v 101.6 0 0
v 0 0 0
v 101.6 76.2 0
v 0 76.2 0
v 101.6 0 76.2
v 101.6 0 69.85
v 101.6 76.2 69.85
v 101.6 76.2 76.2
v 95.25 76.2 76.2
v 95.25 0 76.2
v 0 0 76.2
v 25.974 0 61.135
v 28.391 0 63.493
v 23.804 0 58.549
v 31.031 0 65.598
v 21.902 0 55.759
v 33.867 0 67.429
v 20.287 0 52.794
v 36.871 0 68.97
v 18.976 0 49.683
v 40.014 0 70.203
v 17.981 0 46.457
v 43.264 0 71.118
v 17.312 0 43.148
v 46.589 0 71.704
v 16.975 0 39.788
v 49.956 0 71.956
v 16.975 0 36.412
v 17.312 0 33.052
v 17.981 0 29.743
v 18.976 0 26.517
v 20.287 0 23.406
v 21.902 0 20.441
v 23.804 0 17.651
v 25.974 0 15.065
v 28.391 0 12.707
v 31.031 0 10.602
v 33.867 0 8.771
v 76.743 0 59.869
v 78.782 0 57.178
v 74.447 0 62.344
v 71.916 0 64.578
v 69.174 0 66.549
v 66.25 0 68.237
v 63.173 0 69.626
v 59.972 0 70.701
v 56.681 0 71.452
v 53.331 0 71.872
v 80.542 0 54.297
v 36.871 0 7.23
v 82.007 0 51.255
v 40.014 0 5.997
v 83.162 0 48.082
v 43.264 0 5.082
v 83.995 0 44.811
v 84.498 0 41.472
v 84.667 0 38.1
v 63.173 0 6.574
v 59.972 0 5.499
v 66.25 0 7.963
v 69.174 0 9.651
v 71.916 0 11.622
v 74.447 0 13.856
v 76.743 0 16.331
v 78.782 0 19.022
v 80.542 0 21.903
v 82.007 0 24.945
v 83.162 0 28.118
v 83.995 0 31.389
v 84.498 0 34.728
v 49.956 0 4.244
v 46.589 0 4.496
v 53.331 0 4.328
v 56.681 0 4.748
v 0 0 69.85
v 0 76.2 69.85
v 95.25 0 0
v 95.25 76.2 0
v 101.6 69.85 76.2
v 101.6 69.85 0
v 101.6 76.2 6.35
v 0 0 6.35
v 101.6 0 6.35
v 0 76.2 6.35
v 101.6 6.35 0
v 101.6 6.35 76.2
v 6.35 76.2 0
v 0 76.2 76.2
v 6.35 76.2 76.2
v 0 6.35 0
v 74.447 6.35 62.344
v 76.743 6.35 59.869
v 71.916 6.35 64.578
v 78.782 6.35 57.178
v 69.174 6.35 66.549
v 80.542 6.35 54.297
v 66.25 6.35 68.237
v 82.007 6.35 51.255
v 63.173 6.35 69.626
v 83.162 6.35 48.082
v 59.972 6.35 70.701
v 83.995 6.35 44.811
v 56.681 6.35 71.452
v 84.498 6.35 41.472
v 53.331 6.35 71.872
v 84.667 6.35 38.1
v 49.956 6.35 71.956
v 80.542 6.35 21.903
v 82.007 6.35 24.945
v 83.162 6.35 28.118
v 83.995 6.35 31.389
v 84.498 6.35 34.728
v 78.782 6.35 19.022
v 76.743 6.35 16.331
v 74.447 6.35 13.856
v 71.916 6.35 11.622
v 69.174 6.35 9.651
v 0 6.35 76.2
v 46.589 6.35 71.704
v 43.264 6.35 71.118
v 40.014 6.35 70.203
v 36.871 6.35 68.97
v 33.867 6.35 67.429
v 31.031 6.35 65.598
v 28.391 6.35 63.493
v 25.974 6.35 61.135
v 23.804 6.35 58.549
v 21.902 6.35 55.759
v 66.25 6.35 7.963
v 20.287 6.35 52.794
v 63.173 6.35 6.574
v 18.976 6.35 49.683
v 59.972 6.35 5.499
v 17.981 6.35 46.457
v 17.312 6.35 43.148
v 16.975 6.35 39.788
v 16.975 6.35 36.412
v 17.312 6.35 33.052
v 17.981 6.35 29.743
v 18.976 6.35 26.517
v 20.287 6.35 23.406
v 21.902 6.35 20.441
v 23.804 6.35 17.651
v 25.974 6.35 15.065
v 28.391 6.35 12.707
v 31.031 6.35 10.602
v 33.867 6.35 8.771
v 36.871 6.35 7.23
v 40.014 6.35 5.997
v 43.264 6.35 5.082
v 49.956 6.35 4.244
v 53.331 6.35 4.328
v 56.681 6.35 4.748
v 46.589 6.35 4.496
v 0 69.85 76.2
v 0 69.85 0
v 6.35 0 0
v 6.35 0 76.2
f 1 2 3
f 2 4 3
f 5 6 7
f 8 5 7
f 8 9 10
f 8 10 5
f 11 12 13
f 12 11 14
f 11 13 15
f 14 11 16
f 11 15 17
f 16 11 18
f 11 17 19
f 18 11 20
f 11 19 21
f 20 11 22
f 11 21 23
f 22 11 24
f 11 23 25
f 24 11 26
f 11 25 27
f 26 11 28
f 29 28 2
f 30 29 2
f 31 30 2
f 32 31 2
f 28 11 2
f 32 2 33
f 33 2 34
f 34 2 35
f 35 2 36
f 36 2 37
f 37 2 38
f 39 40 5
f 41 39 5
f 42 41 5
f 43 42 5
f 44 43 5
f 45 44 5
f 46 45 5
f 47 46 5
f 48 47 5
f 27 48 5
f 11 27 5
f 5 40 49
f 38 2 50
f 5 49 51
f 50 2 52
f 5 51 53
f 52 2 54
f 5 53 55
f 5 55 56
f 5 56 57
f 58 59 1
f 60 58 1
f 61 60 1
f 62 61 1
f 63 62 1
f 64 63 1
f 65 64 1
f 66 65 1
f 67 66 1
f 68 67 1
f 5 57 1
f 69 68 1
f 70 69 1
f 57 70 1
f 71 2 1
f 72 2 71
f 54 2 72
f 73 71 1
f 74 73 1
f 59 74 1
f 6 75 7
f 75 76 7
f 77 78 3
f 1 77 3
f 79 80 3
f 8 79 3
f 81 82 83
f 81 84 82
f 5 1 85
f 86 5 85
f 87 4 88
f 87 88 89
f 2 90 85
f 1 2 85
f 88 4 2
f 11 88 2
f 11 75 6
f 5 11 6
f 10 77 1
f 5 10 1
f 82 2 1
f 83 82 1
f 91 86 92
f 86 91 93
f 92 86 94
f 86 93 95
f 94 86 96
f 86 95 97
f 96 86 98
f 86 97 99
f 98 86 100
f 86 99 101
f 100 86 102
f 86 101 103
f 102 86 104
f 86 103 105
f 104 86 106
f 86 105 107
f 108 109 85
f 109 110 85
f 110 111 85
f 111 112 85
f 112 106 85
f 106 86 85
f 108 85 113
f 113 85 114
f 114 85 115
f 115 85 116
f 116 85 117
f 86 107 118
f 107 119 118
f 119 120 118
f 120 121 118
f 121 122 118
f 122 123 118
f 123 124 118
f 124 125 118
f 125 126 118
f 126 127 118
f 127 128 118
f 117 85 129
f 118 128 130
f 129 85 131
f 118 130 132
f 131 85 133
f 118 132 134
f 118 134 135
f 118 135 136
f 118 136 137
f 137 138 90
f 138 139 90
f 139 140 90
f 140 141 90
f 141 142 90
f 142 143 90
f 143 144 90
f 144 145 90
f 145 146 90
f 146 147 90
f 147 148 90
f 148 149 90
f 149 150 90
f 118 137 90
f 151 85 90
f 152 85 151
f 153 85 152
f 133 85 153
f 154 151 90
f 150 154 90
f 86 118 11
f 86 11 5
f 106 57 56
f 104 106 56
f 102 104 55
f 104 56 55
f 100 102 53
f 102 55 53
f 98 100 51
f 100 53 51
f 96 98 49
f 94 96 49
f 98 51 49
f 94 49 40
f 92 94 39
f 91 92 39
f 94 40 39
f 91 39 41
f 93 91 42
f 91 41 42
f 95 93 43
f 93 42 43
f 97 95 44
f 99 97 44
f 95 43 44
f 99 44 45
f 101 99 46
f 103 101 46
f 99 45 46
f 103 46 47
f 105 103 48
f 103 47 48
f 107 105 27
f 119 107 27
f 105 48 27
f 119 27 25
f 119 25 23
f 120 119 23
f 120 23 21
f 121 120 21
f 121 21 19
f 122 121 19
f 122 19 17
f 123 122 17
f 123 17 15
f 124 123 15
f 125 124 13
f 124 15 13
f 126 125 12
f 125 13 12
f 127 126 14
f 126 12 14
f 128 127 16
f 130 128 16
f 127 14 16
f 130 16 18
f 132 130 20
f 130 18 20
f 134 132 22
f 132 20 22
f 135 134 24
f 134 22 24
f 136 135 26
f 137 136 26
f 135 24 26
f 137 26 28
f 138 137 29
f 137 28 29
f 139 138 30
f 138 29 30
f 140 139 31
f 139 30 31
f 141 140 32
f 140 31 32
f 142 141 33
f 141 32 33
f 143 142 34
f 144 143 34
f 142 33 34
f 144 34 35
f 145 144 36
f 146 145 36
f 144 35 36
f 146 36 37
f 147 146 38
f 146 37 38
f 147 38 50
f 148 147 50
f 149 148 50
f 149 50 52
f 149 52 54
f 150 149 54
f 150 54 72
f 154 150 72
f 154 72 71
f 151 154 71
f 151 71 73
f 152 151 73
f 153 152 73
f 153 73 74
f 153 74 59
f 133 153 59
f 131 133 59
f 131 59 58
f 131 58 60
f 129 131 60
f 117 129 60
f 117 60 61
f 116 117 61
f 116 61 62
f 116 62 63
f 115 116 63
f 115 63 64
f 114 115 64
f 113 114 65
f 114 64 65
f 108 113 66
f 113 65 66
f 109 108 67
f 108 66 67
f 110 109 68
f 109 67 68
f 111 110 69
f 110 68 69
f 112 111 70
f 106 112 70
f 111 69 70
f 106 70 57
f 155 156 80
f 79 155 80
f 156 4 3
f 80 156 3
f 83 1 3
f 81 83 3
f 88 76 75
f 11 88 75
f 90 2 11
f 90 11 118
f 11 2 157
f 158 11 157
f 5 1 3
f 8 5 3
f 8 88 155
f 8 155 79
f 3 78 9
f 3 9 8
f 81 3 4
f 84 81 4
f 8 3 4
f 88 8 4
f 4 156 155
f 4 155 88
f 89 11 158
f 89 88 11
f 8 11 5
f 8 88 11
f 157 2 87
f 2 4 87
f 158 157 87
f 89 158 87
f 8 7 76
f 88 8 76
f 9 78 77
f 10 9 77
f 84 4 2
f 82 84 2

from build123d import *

# Parameters (mm, degrees)
F2_W      = 6.35
F2_H      = 6.35
F2_W_2    = 88.9
F3_DEPTH  = 76.2
F4_R      = 33.8666666667
F5_DEPTH  = 6.35
F2_H_2    = 63.5
F6_DEPTH  = 76.2
F7_DEPTH  = 76.2
F8_DEPTH  = 76.2
F9_START  = 69.85
F9_DEPTH  = 6.35
F10_DEPTH = 6.35


with BuildPart() as f3:
    # F2 (on Top) → F3 (new body)
    with BuildSketch(Plane.XY):
        with Locations((98.425, 3.175)):
            Rectangle(F2_W, F2_H)
        with Locations((50.8, 3.175)):
            Rectangle(F2_W_2, F2_H)
        with Locations((3.175, 3.175)):
            Rectangle(F2_W, F2_H)
    extrude(amount=F3_DEPTH)

    # F4 (on face) → F5 (cut, through all)
    with BuildSketch(Plane.XZ):
        with Locations((50.8, 38.1)):
            Circle(F4_R)
    extrude(amount=-F5_DEPTH, mode=Mode.SUBTRACT)


with BuildPart() as f6:
    # F2 (on Top) → F6 (new body)
    with BuildSketch(Plane.XY):
        with Locations((3.175, 3.175)):
            Rectangle(F2_W, F2_H)
        with Locations((3.175, 38.1)):
            Rectangle(F2_W, F2_H_2)
        with Locations((3.175, 73.025)):
            Rectangle(F2_W, F2_H)
    extrude(amount=F6_DEPTH)


with BuildPart() as f7:
    # F2 (on Top) → F7 (new body)
    with BuildSketch(Plane.XY):
        with Locations((3.175, 73.025)):
            Rectangle(F2_W, F2_H)
        with Locations((50.8, 73.025)):
            Rectangle(F2_W_2, F2_H)
        with Locations((98.425, 73.025)):
            Rectangle(F2_W, F2_H)
    extrude(amount=F7_DEPTH)


with BuildPart() as f8:
    # F2 (on Top) → F8 (new body)
    with BuildSketch(Plane.XY):
        with Locations((98.425, 73.025)):
            Rectangle(F2_W, F2_H)
        with Locations((98.425, 38.1)):
            Rectangle(F2_W, F2_H_2)
        with Locations((98.425, 3.175)):
            Rectangle(F2_W, F2_H)
    extrude(amount=F8_DEPTH)


with BuildPart() as f9:
    # F2 (on Top) → F9 (new body)
    with BuildSketch(Plane.XY.offset(F9_START)):
        with Locations((3.175, 3.175)):
            Rectangle(F2_W, F2_H)
        with Locations((3.175, 38.1)):
            Rectangle(F2_W, F2_H_2)
        with Locations((3.175, 73.025)):
            Rectangle(F2_W, F2_H)
        with Locations((50.8, 73.025)):
            Rectangle(F2_W_2, F2_H)
        with Locations((98.425, 73.025)):
            Rectangle(F2_W, F2_H)
        with Locations((98.425, 38.1)):
            Rectangle(F2_W, F2_H_2)
        with Locations((98.425, 3.175)):
            Rectangle(F2_W, F2_H)
        with Locations((50.8, 38.1)):
            Rectangle(F2_W_2, F2_H_2)
        with Locations((50.8, 3.175)):
            Rectangle(F2_W_2, F2_H)
    extrude(amount=F9_DEPTH)


with BuildPart() as f10:
    # F2 (on Top) → F10 (new body)
    with BuildSketch(Plane.XY):
        with Locations((3.175, 3.175)):
            Rectangle(F2_W, F2_H)
        with Locations((3.175, 38.1)):
            Rectangle(F2_W, F2_H_2)
        with Locations((3.175, 73.025)):
            Rectangle(F2_W, F2_H)
        with Locations((50.8, 73.025)):
            Rectangle(F2_W_2, F2_H)
        with Locations((98.425, 73.025)):
            Rectangle(F2_W, F2_H)
        with Locations((98.425, 38.1)):
            Rectangle(F2_W, F2_H_2)
        with Locations((98.425, 3.175)):
            Rectangle(F2_W, F2_H)
        with Locations((50.8, 3.175)):
            Rectangle(F2_W_2, F2_H)
        with Locations((50.8, 38.1)):
            Rectangle(F2_W_2, F2_H_2)
    extrude(amount=F10_DEPTH)


solid = Compound([f3.part, f6.part, f7.part, f8.part, f9.part, f10.part])
